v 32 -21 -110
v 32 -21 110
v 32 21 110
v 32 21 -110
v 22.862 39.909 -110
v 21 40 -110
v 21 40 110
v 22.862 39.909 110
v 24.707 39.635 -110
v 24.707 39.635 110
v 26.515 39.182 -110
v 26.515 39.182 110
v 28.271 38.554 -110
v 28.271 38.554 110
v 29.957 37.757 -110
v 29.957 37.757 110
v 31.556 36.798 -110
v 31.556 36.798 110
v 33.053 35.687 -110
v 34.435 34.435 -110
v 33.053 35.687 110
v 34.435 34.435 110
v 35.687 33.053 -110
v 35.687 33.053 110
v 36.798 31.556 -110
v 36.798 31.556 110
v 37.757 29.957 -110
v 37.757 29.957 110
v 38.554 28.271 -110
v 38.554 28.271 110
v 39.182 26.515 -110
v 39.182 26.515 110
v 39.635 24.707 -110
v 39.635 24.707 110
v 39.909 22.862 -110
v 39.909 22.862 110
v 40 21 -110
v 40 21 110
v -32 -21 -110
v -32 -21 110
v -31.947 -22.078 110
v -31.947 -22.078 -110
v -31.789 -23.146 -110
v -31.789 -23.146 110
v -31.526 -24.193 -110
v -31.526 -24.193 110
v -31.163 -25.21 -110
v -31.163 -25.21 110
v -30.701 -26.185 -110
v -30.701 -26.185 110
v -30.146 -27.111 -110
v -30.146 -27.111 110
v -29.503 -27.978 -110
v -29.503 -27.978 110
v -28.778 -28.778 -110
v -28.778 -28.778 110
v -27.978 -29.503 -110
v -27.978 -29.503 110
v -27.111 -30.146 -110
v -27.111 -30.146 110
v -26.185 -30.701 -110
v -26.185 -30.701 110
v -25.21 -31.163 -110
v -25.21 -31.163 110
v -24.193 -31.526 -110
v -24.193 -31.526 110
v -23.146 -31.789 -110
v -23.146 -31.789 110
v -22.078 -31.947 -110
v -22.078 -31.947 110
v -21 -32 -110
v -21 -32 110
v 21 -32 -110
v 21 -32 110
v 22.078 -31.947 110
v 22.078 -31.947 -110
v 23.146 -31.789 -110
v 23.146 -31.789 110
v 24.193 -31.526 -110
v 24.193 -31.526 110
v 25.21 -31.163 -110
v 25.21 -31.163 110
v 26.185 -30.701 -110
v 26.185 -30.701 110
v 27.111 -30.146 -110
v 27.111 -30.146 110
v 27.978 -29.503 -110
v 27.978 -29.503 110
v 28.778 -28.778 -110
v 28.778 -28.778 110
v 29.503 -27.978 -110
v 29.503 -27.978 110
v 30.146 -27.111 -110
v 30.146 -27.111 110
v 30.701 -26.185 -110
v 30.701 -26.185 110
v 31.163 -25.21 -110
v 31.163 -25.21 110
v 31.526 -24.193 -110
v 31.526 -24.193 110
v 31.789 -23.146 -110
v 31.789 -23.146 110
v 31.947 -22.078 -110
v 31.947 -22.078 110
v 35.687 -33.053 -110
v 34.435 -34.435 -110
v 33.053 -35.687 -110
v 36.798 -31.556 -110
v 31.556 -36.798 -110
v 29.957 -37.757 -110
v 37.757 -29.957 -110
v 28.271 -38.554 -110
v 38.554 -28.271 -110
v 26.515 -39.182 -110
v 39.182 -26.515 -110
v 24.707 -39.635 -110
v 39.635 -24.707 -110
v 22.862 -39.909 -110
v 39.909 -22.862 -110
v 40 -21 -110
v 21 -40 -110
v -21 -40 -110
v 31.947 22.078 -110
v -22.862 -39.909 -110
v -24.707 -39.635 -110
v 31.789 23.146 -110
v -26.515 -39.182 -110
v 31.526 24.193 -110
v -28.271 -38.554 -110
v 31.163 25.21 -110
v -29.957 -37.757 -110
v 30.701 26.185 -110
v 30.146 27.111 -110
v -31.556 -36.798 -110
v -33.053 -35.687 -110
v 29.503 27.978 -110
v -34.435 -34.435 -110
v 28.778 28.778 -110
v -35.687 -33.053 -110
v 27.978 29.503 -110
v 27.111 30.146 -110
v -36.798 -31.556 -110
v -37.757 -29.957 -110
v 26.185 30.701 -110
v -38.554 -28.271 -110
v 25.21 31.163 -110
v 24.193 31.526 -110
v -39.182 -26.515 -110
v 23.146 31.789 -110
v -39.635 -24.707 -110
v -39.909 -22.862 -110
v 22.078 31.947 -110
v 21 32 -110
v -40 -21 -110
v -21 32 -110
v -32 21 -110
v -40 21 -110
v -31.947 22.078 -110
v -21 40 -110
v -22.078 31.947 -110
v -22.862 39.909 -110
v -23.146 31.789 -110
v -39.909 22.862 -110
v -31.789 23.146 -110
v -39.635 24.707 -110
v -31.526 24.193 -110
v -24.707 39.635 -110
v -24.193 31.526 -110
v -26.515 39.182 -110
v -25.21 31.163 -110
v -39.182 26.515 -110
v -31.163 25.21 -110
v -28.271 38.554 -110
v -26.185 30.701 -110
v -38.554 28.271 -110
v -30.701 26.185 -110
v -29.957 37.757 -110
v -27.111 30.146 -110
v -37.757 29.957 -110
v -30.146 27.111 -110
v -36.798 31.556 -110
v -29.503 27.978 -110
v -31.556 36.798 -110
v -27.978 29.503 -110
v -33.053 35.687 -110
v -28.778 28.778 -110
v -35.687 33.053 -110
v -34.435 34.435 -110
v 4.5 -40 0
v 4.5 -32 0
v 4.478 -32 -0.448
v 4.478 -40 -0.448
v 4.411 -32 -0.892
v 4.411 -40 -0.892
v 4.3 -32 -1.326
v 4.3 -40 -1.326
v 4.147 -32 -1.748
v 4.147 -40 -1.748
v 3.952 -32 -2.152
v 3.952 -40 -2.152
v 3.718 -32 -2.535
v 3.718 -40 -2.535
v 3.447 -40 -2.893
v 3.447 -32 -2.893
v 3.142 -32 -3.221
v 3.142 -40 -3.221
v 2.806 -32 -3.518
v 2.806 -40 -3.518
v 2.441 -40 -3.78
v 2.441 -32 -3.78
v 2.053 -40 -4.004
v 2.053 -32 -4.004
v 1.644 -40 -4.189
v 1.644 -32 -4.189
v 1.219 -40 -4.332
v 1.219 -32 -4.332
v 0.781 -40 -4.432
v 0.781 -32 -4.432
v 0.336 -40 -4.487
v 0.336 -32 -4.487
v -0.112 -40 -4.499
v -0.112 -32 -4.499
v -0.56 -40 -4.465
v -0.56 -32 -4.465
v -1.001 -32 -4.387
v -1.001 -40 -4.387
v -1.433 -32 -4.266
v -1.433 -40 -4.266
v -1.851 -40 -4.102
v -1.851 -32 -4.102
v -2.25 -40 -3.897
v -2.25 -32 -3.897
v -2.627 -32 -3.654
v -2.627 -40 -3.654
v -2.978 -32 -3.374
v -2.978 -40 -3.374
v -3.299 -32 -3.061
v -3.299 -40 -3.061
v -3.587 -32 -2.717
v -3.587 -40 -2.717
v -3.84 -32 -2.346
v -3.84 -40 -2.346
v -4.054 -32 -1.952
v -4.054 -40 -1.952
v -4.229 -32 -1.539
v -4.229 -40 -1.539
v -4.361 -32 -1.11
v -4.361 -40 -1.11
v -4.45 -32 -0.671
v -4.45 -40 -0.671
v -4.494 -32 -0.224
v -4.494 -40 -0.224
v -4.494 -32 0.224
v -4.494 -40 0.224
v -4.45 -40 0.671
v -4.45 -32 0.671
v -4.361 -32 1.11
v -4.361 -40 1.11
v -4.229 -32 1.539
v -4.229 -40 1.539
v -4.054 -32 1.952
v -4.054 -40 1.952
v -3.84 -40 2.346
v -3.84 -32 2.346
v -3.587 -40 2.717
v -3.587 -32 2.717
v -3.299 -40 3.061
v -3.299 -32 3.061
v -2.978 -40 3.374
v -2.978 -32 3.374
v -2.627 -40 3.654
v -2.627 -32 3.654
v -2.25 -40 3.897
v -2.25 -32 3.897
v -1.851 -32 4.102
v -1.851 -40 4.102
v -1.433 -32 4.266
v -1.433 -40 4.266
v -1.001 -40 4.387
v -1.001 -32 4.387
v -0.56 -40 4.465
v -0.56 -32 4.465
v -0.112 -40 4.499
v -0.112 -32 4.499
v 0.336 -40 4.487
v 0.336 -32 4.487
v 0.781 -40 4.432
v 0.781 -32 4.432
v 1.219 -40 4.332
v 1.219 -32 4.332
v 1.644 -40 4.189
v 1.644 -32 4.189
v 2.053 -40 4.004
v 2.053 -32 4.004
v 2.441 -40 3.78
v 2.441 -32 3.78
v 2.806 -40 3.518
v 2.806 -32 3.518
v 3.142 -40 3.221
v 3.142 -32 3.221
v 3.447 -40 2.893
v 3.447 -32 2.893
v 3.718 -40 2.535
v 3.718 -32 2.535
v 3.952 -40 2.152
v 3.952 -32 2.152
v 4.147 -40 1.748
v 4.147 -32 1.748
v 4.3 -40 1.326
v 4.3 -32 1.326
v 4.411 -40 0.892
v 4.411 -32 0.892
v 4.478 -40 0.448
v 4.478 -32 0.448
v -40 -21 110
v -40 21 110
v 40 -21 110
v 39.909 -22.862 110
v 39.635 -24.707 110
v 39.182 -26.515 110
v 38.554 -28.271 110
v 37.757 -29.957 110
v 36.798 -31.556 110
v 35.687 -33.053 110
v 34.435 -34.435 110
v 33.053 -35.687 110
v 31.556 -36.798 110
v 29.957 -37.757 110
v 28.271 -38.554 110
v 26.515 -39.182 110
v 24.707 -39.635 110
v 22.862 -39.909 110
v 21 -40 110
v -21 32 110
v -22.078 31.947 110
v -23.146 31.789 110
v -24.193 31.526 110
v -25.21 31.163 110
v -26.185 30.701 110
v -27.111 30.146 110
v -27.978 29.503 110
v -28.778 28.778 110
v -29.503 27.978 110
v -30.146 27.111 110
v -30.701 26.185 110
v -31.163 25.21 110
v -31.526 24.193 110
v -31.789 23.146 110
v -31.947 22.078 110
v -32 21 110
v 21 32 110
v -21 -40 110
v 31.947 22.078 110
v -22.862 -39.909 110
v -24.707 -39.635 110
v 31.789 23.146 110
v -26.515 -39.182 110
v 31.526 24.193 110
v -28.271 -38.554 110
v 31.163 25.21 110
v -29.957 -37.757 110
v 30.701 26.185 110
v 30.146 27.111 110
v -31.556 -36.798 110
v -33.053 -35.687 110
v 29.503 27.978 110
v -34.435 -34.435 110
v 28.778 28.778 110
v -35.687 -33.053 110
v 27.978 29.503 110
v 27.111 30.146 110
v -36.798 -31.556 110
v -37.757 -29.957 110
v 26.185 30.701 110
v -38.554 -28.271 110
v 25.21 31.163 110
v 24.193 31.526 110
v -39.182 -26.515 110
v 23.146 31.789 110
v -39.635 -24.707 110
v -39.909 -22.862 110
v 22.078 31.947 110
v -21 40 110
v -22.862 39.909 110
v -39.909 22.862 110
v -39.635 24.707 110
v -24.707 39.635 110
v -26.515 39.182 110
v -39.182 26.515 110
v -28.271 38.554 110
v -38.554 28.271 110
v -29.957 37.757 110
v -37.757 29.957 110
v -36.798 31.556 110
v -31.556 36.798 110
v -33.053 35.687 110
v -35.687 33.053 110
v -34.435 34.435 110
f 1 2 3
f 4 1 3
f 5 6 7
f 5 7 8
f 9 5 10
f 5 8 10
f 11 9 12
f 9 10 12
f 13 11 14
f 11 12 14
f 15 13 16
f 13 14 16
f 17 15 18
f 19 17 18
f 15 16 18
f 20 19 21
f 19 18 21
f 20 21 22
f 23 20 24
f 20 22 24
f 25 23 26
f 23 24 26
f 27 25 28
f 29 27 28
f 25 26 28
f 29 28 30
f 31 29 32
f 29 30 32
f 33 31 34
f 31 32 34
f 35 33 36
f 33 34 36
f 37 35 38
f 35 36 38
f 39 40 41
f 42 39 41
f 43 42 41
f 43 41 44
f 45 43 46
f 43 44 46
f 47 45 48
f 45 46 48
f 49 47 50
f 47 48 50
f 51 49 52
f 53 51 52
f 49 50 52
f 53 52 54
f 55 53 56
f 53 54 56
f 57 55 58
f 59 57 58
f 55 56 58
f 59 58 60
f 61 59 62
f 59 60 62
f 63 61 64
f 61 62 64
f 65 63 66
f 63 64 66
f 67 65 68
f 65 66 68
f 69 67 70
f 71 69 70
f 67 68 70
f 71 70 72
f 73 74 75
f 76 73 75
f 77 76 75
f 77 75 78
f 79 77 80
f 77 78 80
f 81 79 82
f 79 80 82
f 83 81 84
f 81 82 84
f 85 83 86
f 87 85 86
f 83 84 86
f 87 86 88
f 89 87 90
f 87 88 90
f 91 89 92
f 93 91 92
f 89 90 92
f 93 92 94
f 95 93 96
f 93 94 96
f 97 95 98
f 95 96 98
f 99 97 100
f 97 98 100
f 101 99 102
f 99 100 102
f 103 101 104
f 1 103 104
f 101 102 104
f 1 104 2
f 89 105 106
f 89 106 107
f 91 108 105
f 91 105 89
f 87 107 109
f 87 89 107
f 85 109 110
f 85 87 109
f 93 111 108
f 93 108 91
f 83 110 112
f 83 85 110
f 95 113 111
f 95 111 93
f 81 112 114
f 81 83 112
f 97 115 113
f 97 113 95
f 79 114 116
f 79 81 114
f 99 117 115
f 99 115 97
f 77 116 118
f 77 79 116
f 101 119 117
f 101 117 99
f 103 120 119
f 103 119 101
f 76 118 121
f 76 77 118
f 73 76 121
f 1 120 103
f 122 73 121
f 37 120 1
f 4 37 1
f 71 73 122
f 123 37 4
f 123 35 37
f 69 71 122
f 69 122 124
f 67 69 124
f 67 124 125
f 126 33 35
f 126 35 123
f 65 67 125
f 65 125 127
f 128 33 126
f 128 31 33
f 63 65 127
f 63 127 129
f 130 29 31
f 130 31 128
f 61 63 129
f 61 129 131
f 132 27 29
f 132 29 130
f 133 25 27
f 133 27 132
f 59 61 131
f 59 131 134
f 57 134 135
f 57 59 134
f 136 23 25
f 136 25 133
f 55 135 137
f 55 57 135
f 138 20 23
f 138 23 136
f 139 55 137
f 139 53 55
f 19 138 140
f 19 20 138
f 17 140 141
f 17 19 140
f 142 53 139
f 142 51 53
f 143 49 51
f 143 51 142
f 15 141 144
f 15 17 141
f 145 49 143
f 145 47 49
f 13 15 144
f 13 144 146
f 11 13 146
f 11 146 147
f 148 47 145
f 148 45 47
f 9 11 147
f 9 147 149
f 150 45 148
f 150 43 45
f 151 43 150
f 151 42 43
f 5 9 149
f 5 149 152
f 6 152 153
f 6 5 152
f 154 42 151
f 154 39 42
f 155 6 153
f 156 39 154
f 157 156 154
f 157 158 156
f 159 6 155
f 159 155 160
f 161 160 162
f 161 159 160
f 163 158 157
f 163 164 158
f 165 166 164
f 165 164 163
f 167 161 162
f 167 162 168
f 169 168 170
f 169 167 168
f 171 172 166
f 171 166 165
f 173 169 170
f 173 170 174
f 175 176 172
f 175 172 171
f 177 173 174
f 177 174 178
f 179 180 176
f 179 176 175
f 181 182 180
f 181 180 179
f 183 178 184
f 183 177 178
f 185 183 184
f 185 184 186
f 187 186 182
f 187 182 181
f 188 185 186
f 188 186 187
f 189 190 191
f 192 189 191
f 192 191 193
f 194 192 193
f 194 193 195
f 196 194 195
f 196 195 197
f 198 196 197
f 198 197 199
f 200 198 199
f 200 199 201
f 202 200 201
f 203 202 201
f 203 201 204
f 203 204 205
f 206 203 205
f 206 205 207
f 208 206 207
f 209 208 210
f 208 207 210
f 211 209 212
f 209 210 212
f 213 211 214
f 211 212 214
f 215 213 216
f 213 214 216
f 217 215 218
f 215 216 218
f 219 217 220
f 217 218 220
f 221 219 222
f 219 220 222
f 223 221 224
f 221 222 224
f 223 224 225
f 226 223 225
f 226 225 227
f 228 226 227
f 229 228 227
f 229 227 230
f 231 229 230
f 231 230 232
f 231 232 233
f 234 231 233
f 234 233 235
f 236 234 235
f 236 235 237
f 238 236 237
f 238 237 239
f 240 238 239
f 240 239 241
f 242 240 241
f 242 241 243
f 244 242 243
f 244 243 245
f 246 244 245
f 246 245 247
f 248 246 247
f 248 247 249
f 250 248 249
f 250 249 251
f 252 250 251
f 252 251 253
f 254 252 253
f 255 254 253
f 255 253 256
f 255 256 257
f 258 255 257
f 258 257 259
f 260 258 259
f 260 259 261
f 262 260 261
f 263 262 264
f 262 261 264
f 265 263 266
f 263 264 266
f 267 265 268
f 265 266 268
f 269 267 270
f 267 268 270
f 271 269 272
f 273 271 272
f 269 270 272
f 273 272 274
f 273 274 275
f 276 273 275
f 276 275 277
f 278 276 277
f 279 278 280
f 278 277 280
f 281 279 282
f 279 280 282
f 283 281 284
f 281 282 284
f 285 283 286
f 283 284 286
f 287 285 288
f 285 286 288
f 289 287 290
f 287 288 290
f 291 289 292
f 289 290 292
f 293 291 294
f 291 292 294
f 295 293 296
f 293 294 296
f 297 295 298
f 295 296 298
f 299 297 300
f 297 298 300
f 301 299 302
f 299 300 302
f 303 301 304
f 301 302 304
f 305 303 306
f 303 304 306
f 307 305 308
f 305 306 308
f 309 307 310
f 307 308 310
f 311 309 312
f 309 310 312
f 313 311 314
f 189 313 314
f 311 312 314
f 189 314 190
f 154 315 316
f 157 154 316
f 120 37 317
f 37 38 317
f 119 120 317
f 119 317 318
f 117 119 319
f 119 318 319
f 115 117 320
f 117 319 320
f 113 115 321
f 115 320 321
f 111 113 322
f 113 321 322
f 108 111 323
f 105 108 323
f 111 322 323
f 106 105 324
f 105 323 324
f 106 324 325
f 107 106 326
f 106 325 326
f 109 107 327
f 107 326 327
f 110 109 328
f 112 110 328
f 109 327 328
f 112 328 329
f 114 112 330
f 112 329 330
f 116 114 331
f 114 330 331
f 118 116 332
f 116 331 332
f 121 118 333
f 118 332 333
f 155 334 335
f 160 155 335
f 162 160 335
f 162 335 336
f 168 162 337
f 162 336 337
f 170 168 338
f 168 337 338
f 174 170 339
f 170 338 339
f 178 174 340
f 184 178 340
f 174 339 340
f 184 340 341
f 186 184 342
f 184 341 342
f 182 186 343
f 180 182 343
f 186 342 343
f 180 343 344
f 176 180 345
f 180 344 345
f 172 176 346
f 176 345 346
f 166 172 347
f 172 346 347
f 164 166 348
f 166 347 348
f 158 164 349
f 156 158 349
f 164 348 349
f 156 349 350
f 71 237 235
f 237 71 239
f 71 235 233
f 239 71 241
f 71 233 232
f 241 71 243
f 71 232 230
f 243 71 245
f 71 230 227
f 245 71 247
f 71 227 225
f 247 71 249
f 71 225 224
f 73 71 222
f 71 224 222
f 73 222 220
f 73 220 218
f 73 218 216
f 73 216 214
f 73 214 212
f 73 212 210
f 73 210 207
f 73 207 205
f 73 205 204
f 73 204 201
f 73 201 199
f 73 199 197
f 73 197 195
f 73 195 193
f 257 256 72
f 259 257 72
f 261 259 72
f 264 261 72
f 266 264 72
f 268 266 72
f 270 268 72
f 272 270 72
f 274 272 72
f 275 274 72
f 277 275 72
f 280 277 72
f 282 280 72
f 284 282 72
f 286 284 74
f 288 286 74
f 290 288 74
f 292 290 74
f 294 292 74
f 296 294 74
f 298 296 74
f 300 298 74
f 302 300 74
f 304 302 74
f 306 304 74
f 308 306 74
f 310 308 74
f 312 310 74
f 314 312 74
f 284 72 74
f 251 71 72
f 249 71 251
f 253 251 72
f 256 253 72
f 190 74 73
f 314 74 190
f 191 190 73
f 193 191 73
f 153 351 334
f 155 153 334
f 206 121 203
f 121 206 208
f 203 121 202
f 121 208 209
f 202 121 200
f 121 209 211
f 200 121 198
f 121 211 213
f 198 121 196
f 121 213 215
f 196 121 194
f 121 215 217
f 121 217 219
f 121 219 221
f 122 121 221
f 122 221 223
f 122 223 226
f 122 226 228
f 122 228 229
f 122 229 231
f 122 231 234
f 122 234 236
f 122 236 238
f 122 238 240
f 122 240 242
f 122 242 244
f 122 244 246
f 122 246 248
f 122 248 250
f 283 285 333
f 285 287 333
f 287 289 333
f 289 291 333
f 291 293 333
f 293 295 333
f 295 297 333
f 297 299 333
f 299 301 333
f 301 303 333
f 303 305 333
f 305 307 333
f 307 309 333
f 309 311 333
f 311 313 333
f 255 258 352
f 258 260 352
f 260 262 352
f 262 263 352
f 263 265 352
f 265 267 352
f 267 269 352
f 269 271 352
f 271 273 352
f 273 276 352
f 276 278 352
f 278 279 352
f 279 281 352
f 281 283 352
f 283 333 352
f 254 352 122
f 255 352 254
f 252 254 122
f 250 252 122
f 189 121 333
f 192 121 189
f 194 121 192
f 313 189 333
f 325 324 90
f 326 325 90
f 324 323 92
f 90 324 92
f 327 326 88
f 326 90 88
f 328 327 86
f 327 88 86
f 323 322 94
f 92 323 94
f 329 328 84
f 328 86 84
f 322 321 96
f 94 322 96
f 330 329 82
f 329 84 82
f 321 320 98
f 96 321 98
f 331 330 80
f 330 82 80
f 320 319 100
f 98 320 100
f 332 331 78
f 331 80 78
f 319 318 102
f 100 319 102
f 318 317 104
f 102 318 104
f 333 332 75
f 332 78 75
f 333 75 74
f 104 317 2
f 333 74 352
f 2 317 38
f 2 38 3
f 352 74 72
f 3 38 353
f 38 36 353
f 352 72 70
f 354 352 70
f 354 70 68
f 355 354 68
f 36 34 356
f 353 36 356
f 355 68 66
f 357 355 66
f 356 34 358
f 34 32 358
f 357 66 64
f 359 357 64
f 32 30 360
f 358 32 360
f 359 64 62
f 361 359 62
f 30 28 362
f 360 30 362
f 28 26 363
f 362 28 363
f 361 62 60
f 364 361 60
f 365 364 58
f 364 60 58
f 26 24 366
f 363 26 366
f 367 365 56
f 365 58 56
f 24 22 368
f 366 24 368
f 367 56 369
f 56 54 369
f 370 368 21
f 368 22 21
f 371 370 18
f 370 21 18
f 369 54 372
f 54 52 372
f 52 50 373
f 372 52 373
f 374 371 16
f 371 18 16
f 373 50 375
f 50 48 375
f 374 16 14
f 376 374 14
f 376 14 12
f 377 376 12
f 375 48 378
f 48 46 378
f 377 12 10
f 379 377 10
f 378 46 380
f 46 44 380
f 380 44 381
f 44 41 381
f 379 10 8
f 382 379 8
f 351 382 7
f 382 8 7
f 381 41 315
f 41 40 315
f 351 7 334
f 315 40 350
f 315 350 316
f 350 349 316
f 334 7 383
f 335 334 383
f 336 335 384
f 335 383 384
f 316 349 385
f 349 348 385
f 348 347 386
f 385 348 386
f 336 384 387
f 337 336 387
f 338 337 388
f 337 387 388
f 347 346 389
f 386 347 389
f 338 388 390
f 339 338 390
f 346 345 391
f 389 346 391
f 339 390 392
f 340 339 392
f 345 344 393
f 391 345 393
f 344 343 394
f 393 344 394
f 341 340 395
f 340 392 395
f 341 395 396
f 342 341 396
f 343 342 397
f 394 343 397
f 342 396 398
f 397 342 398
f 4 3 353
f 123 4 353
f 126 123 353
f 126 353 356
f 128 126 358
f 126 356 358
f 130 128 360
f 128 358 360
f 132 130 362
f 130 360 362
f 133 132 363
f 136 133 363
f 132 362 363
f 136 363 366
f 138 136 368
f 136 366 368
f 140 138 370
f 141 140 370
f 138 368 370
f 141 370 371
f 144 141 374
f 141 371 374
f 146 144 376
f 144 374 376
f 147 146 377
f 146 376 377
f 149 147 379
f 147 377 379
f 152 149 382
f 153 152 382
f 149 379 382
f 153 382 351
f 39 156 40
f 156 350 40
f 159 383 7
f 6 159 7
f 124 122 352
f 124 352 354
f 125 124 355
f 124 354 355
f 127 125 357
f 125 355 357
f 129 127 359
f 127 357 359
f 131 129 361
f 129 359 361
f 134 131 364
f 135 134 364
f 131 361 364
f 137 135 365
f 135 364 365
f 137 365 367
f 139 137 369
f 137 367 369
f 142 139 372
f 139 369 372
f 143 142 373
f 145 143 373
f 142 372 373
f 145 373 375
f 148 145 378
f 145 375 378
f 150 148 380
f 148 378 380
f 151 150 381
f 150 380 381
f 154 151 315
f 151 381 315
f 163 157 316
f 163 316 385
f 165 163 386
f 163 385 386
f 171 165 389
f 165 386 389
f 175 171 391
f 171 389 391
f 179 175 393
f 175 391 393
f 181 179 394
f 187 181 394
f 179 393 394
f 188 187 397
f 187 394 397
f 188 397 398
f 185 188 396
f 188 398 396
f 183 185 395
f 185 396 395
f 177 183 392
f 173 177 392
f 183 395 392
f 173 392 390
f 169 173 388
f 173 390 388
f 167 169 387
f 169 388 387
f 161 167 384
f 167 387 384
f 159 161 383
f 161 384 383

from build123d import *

# Parameters (mm, degrees)
EXTRUDE_1_DEPTH = 110
M10X1_0_1_D     = 9
M10X1_0_1_DEPTH = 23
M10X1_0_1_TIP   = 2.703872786


with BuildPart() as part:
    # 草图1 → 凸台-拉伸1 (new, symmetric)
    with BuildSketch(Plane.XY):
        with BuildLine():
            Line((-21, 40), (21, 40))
            ThreePointArc((21, 40), (34.435028843, 34.435028843), (40, 21))
            Line((40, 21), (40, -21))
            ThreePointArc((40, -21), (34.435028843, -34.435028843), (21, -40))
            Line((21, -40), (-21, -40))
            ThreePointArc((-21, -40), (-34.435028843, -34.435028843), (-40, -21))
            Line((-40, -21), (-40, 21))
            ThreePointArc((-40, 21), (-34.435028843, 34.435028843), (-21, 40))
        make_face()
        with BuildLine():
            Line((-32, 21), (-32, -21))
            ThreePointArc((-32, -21), (-28.778174593, -28.778174593), (-21, -32))
            Line((-21, -32), (21, -32))
            ThreePointArc((21, -32), (28.778174593, -28.778174593), (32, -21))
            Line((32, -21), (32, 21))
            ThreePointArc((32, 21), (28.778174593, 28.778174593), (21, 32))
            Line((21, 32), (-21, 32))
            ThreePointArc((-21, 32), (-28.778174593, 28.778174593), (-32, 21))
        make_face(mode=Mode.SUBTRACT)
    extrude(amount=EXTRUDE_1_DEPTH, both=True)

    # M10x1.0 螺纹孔1
    with Locations(Plane(origin=(0, -40, 0), x_dir=(-1, 0, 0), z_dir=(0, -1, 0))):
        with Locations((0, 0)):
            Hole(M10X1_0_1_D / 2, depth=M10X1_0_1_DEPTH)
            with Locations((0, 0, -(M10X1_0_1_DEPTH + M10X1_0_1_TIP / 2))):  # 118° drill point
                Cone(0, M10X1_0_1_D / 2, M10X1_0_1_TIP, mode=Mode.SUBTRACT)


solid = part.part
